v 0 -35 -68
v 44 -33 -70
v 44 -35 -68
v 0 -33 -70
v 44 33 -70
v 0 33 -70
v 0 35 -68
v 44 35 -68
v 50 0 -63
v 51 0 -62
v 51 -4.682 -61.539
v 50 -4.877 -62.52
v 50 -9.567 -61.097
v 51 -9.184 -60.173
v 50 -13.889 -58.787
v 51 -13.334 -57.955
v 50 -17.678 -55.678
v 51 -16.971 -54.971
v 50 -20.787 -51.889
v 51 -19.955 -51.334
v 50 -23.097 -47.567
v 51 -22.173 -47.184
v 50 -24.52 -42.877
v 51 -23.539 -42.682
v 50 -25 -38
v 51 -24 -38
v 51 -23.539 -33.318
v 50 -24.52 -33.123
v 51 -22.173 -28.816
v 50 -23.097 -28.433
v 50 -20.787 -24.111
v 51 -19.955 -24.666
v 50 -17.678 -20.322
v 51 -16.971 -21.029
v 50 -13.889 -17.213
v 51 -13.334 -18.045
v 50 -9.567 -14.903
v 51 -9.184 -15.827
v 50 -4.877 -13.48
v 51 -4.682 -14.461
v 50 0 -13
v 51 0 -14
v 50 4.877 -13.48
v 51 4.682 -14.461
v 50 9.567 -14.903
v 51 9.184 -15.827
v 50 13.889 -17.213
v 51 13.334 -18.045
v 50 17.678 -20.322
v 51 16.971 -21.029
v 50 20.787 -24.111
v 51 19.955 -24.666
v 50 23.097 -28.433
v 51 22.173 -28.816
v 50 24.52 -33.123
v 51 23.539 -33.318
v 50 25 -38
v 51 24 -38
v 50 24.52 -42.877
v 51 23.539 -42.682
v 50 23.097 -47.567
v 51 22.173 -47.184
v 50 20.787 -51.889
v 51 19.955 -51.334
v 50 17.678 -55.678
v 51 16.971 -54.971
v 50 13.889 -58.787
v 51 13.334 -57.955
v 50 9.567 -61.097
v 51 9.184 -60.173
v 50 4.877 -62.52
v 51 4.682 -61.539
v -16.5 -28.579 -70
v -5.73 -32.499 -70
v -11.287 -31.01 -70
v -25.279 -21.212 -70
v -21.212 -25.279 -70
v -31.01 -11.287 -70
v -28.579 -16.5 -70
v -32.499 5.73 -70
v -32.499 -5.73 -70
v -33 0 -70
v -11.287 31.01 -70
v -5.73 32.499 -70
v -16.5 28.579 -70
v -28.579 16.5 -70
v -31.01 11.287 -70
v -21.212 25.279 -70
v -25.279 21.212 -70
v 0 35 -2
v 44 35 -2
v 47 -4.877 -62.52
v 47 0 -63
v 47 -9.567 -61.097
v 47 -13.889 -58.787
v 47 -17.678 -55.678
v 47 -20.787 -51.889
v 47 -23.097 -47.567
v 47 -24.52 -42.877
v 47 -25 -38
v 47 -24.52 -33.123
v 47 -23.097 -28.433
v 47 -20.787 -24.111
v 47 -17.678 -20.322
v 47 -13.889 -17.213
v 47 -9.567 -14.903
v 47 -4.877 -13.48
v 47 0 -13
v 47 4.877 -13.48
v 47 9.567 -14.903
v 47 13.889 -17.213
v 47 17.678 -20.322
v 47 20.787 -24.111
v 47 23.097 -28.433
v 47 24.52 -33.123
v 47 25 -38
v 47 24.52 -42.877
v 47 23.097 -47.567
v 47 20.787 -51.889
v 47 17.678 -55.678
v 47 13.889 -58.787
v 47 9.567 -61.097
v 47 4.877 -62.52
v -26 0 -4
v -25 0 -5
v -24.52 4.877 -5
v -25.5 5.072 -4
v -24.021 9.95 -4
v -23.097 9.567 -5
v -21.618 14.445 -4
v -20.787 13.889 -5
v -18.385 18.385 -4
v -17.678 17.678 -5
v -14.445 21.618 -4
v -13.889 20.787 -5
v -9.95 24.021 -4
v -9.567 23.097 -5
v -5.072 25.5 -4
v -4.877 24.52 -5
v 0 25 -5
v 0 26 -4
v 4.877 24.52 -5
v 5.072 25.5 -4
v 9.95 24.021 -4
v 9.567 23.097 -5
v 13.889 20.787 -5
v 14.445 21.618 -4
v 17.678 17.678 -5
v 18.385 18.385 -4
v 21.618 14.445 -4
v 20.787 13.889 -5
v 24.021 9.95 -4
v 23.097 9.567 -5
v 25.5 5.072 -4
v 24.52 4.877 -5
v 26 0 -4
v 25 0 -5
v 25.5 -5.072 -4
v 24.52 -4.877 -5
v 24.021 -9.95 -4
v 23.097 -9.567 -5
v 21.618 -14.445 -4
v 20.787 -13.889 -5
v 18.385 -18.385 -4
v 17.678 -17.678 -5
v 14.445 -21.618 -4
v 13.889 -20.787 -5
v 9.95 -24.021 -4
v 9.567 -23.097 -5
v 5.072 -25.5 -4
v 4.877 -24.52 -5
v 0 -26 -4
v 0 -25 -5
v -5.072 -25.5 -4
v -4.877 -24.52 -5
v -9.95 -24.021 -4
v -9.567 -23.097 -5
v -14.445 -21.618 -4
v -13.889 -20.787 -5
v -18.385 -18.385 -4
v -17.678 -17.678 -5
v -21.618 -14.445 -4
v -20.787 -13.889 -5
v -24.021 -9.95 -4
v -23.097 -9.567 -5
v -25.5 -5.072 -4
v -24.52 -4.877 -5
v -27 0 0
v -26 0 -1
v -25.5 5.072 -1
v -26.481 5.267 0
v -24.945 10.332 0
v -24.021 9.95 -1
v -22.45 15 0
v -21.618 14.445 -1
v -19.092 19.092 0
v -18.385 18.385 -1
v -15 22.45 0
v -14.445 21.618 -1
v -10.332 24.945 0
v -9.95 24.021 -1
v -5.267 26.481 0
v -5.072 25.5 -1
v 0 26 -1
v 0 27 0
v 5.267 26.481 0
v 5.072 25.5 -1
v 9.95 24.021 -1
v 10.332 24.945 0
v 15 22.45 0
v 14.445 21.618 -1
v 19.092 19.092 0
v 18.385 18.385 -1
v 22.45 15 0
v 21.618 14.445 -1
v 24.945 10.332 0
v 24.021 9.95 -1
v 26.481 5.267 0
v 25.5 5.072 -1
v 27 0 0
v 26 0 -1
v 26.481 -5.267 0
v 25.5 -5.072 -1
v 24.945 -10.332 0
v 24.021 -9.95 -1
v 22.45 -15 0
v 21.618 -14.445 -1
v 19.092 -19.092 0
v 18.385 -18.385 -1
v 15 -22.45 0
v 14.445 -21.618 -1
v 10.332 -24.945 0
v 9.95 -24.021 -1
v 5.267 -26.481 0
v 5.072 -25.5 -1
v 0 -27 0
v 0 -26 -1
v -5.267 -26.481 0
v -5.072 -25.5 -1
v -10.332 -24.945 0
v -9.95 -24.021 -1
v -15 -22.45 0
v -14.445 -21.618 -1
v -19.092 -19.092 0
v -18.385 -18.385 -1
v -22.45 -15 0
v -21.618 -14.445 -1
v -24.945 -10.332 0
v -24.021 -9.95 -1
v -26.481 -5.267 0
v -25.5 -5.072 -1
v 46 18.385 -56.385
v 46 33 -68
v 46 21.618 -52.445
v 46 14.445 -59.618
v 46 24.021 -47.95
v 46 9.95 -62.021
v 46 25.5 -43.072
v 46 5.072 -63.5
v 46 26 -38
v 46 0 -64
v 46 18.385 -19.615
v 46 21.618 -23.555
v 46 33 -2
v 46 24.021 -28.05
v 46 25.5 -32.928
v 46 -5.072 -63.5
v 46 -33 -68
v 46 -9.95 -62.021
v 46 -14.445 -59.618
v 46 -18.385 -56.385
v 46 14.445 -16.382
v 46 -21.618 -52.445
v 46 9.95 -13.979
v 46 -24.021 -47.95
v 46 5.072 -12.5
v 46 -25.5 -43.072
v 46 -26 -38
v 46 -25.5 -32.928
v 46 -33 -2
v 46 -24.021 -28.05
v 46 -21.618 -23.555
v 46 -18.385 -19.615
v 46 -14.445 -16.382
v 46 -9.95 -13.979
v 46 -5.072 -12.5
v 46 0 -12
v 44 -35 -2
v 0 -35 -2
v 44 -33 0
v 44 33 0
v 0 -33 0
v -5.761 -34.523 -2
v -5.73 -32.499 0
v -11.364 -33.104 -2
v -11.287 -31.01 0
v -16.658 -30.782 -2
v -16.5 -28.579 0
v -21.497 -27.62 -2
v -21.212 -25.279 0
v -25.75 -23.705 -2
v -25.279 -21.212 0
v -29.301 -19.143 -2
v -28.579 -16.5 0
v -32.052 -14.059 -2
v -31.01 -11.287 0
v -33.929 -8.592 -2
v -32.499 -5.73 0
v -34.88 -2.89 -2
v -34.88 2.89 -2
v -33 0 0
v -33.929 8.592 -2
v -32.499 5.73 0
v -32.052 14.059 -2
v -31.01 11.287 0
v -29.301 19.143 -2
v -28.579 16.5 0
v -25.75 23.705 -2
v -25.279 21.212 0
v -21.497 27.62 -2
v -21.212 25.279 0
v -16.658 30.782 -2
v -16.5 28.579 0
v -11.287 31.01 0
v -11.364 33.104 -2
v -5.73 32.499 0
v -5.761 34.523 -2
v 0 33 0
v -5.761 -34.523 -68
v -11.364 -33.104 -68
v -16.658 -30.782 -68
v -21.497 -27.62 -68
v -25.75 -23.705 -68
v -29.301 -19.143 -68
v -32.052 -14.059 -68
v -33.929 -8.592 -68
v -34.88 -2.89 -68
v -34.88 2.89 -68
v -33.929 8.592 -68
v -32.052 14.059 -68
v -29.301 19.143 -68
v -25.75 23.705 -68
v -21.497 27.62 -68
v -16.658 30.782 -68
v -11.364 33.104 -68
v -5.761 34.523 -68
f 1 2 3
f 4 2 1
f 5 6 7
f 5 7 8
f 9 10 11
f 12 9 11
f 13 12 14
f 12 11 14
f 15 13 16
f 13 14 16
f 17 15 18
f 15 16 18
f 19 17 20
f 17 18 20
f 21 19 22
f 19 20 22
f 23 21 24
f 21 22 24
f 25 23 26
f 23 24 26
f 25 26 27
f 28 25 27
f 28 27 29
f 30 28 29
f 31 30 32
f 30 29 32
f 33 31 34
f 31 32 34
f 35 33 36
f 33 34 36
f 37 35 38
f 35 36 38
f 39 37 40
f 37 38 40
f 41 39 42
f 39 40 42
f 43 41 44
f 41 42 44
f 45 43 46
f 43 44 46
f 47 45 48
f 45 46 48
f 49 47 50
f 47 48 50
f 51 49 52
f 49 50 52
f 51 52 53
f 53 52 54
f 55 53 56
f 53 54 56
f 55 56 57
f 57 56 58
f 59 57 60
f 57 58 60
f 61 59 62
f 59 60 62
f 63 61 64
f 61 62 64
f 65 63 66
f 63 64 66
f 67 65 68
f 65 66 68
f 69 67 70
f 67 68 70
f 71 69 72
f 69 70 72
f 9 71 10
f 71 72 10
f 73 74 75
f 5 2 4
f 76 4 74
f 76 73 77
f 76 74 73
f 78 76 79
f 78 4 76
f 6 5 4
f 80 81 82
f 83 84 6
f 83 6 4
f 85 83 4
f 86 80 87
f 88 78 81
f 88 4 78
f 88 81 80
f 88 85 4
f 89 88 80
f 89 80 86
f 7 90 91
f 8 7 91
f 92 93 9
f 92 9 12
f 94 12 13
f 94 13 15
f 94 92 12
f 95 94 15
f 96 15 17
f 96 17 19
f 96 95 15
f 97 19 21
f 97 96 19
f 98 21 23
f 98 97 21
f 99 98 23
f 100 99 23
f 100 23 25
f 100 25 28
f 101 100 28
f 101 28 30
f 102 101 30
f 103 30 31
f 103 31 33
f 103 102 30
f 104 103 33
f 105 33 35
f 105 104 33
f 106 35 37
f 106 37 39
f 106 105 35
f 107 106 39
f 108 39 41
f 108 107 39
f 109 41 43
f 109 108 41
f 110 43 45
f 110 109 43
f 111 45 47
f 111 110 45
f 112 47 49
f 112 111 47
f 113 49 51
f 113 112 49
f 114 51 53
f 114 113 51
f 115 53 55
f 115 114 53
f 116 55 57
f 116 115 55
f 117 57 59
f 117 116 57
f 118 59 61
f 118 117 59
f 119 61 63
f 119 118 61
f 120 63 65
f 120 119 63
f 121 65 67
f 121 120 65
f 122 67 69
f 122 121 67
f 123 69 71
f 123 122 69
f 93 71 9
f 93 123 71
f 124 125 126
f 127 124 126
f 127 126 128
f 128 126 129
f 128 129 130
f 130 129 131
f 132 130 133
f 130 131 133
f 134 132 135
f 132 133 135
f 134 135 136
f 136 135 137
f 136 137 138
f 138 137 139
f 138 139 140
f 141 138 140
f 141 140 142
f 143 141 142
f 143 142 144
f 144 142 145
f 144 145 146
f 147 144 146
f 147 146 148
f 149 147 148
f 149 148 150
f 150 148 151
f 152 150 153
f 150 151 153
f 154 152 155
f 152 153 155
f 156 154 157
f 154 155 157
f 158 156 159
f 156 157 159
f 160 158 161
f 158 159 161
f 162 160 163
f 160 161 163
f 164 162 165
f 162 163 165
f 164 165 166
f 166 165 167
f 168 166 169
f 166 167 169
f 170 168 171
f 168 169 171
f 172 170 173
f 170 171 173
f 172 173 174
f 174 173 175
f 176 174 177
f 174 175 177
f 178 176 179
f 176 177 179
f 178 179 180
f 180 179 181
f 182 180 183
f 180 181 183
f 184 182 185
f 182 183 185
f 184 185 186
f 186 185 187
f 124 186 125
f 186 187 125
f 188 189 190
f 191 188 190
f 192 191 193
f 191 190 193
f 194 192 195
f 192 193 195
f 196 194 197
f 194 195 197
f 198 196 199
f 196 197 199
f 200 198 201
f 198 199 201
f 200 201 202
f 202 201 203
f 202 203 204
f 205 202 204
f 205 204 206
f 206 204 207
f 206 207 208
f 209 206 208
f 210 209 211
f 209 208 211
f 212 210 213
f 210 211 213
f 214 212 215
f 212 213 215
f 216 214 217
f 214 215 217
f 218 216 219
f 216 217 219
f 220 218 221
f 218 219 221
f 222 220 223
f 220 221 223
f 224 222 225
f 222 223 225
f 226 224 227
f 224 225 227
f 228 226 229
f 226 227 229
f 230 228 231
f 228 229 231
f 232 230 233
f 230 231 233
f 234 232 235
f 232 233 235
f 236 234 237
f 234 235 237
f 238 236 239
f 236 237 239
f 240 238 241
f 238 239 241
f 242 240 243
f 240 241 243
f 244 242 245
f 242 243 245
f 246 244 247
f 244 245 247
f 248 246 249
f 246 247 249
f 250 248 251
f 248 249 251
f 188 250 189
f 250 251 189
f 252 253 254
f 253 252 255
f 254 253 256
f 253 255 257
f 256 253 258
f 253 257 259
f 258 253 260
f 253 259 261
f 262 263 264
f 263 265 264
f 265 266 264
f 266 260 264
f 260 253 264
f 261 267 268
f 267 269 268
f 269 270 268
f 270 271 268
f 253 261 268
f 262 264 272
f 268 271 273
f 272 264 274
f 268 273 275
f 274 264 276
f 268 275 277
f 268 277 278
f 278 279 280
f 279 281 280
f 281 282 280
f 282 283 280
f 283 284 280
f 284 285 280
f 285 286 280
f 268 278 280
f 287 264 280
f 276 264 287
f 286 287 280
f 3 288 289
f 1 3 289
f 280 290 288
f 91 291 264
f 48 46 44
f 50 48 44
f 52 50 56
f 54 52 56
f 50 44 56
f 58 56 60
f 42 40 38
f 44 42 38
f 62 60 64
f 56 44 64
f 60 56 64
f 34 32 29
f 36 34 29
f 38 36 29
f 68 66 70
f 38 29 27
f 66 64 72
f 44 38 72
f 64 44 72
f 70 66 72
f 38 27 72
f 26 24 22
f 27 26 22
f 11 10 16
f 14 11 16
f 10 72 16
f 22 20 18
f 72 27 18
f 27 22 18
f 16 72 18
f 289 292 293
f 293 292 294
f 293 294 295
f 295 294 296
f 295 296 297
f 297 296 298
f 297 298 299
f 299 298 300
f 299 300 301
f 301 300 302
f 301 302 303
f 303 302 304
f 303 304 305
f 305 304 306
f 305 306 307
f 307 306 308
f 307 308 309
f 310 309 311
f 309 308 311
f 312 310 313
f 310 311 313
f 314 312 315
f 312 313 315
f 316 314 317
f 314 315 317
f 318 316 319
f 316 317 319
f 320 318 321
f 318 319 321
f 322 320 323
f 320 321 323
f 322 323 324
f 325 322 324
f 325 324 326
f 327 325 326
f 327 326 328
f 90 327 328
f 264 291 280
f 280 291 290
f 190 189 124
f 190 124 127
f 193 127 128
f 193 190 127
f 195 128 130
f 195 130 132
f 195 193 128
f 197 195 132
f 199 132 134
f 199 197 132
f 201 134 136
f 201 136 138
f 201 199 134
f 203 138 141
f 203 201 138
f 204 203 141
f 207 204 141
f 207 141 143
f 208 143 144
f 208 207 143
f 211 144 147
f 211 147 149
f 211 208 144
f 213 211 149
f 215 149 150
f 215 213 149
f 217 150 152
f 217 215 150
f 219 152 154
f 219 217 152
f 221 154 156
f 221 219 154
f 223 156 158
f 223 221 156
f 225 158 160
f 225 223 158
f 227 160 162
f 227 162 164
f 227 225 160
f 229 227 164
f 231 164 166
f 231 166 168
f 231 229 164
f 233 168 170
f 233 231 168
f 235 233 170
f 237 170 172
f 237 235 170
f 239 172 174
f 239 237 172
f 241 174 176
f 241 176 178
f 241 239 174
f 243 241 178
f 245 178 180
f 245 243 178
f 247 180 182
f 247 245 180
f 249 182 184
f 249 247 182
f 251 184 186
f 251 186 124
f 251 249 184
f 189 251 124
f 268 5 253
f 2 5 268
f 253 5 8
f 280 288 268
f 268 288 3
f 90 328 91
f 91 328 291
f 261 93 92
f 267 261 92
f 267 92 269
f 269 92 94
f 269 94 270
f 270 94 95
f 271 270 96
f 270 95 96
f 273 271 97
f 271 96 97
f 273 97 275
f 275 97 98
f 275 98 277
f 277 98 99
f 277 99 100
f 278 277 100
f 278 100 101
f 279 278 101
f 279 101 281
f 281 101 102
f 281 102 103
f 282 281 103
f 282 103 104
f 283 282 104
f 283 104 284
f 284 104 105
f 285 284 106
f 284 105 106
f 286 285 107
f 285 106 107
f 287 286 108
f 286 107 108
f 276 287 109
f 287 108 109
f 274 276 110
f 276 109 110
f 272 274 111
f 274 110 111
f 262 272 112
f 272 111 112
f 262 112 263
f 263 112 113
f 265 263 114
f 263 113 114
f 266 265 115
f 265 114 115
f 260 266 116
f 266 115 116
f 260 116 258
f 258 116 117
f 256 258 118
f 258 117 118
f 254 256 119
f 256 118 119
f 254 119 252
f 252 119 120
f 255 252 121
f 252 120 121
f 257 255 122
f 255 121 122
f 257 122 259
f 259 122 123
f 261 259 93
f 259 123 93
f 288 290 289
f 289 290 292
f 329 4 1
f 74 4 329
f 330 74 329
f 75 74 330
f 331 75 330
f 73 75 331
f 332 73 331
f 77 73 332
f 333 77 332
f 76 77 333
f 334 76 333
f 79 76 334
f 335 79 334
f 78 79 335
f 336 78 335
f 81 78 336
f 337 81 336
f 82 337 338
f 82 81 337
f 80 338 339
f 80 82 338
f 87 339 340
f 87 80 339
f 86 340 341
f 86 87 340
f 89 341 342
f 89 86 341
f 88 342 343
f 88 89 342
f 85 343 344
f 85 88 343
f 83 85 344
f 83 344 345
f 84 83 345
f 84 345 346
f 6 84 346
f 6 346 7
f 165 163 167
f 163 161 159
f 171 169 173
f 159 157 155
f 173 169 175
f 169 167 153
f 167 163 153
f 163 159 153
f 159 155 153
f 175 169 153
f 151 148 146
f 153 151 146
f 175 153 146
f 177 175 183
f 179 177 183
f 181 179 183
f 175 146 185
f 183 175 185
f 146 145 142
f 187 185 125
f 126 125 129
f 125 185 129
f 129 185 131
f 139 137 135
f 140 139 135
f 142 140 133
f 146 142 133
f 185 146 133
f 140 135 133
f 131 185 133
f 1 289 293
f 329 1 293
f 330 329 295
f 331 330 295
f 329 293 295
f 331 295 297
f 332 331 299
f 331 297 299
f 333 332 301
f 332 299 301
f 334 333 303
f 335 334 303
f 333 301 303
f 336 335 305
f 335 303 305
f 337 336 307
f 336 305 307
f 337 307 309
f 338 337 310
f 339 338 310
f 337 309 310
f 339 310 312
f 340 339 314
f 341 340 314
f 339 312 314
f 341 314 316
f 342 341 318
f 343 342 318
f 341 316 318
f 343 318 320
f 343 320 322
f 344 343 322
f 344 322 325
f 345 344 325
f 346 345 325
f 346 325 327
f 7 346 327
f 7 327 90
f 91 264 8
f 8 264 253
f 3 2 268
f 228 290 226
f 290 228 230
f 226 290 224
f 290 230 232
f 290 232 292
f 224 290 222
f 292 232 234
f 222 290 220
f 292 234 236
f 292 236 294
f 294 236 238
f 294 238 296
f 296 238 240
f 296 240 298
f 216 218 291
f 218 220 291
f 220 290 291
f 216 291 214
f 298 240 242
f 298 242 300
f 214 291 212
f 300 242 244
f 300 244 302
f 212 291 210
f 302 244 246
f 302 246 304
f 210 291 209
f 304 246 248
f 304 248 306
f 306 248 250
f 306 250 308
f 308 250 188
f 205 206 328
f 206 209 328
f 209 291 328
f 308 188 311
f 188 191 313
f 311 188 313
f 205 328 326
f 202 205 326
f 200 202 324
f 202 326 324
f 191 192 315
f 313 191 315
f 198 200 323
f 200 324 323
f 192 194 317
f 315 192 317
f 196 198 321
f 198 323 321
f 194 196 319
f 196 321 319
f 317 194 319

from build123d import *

# Parameters (mm, degrees)
BOSS_EXTRUDE1_DEPTH = 70
SKETCH4_R           = 25
BOSS_EXTRUDE2_DEPTH = 5
CHAMFER1_SIZE       = 2
SKETCH5_R           = 26
CUT_EXTRUDE1_DEPTH  = 5
CHAMFER3_SIZE       = 1


with BuildPart() as part:
    # Sketch3 → Boss-Extrude1 (new body)
    with BuildSketch(Plane.XY):
        with BuildLine():
            Line((0, 35), (46, 35))
            Line((46, 35), (46, -35))
            Line((46, -35), (0, -35))
            ThreePointArc((0, -35), (-35, 0), (0, 35))
        make_face()
    extrude(amount=BOSS_EXTRUDE1_DEPTH)

    # Sketch4 → Boss-Extrude2 (add)
    with BuildSketch(Plane(origin=(46, 0, 0), x_dir=(0, 0, -1), z_dir=(1, 0, 0))):
        with Locations(Location((-38, 0, 0), (0, 0, 180))):
            Circle(SKETCH4_R)
    extrude(amount=BOSS_EXTRUDE2_DEPTH)

    # Chamfer1
    chamfer1_edges = [part.edges().sort_by_distance(p)[0] for p in [
        (46, 0, 70),
        (23, 35, 70),
        (-35, 0, 70),
        (23, 35, 0),
        (46, 0, 0),
        (23, -35, 0),
        (-35, 0, 0),
        (23, -35, 70),
        (46, 35, 35),
        (46, -35, 35),
    ]]
    chamfer(chamfer1_edges, length=CHAMFER1_SIZE)

    # Sketch5 → Cut-Extrude1 (cut)
    with BuildSketch(Plane(origin=(0, 0, 0), x_dir=(-1, 0, 0), z_dir=(0, 0, -1))):
        Circle(SKETCH5_R)
    extrude(amount=-CUT_EXTRUDE1_DEPTH, mode=Mode.SUBTRACT)

    # Chamfer3
    chamfer3_edges = [part.edges().sort_by_distance(p)[0] for p in [
        (46, 0, 13),
        (51, 0, 13),
        (26, 0, 5),
        (26, 0, 0),
    ]]
    chamfer(chamfer3_edges, length=CHAMFER3_SIZE)


with BuildPart() as body_2:
    # Mirror1: mirrored copy
    add(part.part.mirror(Plane.XY))


solid = body_2.part
